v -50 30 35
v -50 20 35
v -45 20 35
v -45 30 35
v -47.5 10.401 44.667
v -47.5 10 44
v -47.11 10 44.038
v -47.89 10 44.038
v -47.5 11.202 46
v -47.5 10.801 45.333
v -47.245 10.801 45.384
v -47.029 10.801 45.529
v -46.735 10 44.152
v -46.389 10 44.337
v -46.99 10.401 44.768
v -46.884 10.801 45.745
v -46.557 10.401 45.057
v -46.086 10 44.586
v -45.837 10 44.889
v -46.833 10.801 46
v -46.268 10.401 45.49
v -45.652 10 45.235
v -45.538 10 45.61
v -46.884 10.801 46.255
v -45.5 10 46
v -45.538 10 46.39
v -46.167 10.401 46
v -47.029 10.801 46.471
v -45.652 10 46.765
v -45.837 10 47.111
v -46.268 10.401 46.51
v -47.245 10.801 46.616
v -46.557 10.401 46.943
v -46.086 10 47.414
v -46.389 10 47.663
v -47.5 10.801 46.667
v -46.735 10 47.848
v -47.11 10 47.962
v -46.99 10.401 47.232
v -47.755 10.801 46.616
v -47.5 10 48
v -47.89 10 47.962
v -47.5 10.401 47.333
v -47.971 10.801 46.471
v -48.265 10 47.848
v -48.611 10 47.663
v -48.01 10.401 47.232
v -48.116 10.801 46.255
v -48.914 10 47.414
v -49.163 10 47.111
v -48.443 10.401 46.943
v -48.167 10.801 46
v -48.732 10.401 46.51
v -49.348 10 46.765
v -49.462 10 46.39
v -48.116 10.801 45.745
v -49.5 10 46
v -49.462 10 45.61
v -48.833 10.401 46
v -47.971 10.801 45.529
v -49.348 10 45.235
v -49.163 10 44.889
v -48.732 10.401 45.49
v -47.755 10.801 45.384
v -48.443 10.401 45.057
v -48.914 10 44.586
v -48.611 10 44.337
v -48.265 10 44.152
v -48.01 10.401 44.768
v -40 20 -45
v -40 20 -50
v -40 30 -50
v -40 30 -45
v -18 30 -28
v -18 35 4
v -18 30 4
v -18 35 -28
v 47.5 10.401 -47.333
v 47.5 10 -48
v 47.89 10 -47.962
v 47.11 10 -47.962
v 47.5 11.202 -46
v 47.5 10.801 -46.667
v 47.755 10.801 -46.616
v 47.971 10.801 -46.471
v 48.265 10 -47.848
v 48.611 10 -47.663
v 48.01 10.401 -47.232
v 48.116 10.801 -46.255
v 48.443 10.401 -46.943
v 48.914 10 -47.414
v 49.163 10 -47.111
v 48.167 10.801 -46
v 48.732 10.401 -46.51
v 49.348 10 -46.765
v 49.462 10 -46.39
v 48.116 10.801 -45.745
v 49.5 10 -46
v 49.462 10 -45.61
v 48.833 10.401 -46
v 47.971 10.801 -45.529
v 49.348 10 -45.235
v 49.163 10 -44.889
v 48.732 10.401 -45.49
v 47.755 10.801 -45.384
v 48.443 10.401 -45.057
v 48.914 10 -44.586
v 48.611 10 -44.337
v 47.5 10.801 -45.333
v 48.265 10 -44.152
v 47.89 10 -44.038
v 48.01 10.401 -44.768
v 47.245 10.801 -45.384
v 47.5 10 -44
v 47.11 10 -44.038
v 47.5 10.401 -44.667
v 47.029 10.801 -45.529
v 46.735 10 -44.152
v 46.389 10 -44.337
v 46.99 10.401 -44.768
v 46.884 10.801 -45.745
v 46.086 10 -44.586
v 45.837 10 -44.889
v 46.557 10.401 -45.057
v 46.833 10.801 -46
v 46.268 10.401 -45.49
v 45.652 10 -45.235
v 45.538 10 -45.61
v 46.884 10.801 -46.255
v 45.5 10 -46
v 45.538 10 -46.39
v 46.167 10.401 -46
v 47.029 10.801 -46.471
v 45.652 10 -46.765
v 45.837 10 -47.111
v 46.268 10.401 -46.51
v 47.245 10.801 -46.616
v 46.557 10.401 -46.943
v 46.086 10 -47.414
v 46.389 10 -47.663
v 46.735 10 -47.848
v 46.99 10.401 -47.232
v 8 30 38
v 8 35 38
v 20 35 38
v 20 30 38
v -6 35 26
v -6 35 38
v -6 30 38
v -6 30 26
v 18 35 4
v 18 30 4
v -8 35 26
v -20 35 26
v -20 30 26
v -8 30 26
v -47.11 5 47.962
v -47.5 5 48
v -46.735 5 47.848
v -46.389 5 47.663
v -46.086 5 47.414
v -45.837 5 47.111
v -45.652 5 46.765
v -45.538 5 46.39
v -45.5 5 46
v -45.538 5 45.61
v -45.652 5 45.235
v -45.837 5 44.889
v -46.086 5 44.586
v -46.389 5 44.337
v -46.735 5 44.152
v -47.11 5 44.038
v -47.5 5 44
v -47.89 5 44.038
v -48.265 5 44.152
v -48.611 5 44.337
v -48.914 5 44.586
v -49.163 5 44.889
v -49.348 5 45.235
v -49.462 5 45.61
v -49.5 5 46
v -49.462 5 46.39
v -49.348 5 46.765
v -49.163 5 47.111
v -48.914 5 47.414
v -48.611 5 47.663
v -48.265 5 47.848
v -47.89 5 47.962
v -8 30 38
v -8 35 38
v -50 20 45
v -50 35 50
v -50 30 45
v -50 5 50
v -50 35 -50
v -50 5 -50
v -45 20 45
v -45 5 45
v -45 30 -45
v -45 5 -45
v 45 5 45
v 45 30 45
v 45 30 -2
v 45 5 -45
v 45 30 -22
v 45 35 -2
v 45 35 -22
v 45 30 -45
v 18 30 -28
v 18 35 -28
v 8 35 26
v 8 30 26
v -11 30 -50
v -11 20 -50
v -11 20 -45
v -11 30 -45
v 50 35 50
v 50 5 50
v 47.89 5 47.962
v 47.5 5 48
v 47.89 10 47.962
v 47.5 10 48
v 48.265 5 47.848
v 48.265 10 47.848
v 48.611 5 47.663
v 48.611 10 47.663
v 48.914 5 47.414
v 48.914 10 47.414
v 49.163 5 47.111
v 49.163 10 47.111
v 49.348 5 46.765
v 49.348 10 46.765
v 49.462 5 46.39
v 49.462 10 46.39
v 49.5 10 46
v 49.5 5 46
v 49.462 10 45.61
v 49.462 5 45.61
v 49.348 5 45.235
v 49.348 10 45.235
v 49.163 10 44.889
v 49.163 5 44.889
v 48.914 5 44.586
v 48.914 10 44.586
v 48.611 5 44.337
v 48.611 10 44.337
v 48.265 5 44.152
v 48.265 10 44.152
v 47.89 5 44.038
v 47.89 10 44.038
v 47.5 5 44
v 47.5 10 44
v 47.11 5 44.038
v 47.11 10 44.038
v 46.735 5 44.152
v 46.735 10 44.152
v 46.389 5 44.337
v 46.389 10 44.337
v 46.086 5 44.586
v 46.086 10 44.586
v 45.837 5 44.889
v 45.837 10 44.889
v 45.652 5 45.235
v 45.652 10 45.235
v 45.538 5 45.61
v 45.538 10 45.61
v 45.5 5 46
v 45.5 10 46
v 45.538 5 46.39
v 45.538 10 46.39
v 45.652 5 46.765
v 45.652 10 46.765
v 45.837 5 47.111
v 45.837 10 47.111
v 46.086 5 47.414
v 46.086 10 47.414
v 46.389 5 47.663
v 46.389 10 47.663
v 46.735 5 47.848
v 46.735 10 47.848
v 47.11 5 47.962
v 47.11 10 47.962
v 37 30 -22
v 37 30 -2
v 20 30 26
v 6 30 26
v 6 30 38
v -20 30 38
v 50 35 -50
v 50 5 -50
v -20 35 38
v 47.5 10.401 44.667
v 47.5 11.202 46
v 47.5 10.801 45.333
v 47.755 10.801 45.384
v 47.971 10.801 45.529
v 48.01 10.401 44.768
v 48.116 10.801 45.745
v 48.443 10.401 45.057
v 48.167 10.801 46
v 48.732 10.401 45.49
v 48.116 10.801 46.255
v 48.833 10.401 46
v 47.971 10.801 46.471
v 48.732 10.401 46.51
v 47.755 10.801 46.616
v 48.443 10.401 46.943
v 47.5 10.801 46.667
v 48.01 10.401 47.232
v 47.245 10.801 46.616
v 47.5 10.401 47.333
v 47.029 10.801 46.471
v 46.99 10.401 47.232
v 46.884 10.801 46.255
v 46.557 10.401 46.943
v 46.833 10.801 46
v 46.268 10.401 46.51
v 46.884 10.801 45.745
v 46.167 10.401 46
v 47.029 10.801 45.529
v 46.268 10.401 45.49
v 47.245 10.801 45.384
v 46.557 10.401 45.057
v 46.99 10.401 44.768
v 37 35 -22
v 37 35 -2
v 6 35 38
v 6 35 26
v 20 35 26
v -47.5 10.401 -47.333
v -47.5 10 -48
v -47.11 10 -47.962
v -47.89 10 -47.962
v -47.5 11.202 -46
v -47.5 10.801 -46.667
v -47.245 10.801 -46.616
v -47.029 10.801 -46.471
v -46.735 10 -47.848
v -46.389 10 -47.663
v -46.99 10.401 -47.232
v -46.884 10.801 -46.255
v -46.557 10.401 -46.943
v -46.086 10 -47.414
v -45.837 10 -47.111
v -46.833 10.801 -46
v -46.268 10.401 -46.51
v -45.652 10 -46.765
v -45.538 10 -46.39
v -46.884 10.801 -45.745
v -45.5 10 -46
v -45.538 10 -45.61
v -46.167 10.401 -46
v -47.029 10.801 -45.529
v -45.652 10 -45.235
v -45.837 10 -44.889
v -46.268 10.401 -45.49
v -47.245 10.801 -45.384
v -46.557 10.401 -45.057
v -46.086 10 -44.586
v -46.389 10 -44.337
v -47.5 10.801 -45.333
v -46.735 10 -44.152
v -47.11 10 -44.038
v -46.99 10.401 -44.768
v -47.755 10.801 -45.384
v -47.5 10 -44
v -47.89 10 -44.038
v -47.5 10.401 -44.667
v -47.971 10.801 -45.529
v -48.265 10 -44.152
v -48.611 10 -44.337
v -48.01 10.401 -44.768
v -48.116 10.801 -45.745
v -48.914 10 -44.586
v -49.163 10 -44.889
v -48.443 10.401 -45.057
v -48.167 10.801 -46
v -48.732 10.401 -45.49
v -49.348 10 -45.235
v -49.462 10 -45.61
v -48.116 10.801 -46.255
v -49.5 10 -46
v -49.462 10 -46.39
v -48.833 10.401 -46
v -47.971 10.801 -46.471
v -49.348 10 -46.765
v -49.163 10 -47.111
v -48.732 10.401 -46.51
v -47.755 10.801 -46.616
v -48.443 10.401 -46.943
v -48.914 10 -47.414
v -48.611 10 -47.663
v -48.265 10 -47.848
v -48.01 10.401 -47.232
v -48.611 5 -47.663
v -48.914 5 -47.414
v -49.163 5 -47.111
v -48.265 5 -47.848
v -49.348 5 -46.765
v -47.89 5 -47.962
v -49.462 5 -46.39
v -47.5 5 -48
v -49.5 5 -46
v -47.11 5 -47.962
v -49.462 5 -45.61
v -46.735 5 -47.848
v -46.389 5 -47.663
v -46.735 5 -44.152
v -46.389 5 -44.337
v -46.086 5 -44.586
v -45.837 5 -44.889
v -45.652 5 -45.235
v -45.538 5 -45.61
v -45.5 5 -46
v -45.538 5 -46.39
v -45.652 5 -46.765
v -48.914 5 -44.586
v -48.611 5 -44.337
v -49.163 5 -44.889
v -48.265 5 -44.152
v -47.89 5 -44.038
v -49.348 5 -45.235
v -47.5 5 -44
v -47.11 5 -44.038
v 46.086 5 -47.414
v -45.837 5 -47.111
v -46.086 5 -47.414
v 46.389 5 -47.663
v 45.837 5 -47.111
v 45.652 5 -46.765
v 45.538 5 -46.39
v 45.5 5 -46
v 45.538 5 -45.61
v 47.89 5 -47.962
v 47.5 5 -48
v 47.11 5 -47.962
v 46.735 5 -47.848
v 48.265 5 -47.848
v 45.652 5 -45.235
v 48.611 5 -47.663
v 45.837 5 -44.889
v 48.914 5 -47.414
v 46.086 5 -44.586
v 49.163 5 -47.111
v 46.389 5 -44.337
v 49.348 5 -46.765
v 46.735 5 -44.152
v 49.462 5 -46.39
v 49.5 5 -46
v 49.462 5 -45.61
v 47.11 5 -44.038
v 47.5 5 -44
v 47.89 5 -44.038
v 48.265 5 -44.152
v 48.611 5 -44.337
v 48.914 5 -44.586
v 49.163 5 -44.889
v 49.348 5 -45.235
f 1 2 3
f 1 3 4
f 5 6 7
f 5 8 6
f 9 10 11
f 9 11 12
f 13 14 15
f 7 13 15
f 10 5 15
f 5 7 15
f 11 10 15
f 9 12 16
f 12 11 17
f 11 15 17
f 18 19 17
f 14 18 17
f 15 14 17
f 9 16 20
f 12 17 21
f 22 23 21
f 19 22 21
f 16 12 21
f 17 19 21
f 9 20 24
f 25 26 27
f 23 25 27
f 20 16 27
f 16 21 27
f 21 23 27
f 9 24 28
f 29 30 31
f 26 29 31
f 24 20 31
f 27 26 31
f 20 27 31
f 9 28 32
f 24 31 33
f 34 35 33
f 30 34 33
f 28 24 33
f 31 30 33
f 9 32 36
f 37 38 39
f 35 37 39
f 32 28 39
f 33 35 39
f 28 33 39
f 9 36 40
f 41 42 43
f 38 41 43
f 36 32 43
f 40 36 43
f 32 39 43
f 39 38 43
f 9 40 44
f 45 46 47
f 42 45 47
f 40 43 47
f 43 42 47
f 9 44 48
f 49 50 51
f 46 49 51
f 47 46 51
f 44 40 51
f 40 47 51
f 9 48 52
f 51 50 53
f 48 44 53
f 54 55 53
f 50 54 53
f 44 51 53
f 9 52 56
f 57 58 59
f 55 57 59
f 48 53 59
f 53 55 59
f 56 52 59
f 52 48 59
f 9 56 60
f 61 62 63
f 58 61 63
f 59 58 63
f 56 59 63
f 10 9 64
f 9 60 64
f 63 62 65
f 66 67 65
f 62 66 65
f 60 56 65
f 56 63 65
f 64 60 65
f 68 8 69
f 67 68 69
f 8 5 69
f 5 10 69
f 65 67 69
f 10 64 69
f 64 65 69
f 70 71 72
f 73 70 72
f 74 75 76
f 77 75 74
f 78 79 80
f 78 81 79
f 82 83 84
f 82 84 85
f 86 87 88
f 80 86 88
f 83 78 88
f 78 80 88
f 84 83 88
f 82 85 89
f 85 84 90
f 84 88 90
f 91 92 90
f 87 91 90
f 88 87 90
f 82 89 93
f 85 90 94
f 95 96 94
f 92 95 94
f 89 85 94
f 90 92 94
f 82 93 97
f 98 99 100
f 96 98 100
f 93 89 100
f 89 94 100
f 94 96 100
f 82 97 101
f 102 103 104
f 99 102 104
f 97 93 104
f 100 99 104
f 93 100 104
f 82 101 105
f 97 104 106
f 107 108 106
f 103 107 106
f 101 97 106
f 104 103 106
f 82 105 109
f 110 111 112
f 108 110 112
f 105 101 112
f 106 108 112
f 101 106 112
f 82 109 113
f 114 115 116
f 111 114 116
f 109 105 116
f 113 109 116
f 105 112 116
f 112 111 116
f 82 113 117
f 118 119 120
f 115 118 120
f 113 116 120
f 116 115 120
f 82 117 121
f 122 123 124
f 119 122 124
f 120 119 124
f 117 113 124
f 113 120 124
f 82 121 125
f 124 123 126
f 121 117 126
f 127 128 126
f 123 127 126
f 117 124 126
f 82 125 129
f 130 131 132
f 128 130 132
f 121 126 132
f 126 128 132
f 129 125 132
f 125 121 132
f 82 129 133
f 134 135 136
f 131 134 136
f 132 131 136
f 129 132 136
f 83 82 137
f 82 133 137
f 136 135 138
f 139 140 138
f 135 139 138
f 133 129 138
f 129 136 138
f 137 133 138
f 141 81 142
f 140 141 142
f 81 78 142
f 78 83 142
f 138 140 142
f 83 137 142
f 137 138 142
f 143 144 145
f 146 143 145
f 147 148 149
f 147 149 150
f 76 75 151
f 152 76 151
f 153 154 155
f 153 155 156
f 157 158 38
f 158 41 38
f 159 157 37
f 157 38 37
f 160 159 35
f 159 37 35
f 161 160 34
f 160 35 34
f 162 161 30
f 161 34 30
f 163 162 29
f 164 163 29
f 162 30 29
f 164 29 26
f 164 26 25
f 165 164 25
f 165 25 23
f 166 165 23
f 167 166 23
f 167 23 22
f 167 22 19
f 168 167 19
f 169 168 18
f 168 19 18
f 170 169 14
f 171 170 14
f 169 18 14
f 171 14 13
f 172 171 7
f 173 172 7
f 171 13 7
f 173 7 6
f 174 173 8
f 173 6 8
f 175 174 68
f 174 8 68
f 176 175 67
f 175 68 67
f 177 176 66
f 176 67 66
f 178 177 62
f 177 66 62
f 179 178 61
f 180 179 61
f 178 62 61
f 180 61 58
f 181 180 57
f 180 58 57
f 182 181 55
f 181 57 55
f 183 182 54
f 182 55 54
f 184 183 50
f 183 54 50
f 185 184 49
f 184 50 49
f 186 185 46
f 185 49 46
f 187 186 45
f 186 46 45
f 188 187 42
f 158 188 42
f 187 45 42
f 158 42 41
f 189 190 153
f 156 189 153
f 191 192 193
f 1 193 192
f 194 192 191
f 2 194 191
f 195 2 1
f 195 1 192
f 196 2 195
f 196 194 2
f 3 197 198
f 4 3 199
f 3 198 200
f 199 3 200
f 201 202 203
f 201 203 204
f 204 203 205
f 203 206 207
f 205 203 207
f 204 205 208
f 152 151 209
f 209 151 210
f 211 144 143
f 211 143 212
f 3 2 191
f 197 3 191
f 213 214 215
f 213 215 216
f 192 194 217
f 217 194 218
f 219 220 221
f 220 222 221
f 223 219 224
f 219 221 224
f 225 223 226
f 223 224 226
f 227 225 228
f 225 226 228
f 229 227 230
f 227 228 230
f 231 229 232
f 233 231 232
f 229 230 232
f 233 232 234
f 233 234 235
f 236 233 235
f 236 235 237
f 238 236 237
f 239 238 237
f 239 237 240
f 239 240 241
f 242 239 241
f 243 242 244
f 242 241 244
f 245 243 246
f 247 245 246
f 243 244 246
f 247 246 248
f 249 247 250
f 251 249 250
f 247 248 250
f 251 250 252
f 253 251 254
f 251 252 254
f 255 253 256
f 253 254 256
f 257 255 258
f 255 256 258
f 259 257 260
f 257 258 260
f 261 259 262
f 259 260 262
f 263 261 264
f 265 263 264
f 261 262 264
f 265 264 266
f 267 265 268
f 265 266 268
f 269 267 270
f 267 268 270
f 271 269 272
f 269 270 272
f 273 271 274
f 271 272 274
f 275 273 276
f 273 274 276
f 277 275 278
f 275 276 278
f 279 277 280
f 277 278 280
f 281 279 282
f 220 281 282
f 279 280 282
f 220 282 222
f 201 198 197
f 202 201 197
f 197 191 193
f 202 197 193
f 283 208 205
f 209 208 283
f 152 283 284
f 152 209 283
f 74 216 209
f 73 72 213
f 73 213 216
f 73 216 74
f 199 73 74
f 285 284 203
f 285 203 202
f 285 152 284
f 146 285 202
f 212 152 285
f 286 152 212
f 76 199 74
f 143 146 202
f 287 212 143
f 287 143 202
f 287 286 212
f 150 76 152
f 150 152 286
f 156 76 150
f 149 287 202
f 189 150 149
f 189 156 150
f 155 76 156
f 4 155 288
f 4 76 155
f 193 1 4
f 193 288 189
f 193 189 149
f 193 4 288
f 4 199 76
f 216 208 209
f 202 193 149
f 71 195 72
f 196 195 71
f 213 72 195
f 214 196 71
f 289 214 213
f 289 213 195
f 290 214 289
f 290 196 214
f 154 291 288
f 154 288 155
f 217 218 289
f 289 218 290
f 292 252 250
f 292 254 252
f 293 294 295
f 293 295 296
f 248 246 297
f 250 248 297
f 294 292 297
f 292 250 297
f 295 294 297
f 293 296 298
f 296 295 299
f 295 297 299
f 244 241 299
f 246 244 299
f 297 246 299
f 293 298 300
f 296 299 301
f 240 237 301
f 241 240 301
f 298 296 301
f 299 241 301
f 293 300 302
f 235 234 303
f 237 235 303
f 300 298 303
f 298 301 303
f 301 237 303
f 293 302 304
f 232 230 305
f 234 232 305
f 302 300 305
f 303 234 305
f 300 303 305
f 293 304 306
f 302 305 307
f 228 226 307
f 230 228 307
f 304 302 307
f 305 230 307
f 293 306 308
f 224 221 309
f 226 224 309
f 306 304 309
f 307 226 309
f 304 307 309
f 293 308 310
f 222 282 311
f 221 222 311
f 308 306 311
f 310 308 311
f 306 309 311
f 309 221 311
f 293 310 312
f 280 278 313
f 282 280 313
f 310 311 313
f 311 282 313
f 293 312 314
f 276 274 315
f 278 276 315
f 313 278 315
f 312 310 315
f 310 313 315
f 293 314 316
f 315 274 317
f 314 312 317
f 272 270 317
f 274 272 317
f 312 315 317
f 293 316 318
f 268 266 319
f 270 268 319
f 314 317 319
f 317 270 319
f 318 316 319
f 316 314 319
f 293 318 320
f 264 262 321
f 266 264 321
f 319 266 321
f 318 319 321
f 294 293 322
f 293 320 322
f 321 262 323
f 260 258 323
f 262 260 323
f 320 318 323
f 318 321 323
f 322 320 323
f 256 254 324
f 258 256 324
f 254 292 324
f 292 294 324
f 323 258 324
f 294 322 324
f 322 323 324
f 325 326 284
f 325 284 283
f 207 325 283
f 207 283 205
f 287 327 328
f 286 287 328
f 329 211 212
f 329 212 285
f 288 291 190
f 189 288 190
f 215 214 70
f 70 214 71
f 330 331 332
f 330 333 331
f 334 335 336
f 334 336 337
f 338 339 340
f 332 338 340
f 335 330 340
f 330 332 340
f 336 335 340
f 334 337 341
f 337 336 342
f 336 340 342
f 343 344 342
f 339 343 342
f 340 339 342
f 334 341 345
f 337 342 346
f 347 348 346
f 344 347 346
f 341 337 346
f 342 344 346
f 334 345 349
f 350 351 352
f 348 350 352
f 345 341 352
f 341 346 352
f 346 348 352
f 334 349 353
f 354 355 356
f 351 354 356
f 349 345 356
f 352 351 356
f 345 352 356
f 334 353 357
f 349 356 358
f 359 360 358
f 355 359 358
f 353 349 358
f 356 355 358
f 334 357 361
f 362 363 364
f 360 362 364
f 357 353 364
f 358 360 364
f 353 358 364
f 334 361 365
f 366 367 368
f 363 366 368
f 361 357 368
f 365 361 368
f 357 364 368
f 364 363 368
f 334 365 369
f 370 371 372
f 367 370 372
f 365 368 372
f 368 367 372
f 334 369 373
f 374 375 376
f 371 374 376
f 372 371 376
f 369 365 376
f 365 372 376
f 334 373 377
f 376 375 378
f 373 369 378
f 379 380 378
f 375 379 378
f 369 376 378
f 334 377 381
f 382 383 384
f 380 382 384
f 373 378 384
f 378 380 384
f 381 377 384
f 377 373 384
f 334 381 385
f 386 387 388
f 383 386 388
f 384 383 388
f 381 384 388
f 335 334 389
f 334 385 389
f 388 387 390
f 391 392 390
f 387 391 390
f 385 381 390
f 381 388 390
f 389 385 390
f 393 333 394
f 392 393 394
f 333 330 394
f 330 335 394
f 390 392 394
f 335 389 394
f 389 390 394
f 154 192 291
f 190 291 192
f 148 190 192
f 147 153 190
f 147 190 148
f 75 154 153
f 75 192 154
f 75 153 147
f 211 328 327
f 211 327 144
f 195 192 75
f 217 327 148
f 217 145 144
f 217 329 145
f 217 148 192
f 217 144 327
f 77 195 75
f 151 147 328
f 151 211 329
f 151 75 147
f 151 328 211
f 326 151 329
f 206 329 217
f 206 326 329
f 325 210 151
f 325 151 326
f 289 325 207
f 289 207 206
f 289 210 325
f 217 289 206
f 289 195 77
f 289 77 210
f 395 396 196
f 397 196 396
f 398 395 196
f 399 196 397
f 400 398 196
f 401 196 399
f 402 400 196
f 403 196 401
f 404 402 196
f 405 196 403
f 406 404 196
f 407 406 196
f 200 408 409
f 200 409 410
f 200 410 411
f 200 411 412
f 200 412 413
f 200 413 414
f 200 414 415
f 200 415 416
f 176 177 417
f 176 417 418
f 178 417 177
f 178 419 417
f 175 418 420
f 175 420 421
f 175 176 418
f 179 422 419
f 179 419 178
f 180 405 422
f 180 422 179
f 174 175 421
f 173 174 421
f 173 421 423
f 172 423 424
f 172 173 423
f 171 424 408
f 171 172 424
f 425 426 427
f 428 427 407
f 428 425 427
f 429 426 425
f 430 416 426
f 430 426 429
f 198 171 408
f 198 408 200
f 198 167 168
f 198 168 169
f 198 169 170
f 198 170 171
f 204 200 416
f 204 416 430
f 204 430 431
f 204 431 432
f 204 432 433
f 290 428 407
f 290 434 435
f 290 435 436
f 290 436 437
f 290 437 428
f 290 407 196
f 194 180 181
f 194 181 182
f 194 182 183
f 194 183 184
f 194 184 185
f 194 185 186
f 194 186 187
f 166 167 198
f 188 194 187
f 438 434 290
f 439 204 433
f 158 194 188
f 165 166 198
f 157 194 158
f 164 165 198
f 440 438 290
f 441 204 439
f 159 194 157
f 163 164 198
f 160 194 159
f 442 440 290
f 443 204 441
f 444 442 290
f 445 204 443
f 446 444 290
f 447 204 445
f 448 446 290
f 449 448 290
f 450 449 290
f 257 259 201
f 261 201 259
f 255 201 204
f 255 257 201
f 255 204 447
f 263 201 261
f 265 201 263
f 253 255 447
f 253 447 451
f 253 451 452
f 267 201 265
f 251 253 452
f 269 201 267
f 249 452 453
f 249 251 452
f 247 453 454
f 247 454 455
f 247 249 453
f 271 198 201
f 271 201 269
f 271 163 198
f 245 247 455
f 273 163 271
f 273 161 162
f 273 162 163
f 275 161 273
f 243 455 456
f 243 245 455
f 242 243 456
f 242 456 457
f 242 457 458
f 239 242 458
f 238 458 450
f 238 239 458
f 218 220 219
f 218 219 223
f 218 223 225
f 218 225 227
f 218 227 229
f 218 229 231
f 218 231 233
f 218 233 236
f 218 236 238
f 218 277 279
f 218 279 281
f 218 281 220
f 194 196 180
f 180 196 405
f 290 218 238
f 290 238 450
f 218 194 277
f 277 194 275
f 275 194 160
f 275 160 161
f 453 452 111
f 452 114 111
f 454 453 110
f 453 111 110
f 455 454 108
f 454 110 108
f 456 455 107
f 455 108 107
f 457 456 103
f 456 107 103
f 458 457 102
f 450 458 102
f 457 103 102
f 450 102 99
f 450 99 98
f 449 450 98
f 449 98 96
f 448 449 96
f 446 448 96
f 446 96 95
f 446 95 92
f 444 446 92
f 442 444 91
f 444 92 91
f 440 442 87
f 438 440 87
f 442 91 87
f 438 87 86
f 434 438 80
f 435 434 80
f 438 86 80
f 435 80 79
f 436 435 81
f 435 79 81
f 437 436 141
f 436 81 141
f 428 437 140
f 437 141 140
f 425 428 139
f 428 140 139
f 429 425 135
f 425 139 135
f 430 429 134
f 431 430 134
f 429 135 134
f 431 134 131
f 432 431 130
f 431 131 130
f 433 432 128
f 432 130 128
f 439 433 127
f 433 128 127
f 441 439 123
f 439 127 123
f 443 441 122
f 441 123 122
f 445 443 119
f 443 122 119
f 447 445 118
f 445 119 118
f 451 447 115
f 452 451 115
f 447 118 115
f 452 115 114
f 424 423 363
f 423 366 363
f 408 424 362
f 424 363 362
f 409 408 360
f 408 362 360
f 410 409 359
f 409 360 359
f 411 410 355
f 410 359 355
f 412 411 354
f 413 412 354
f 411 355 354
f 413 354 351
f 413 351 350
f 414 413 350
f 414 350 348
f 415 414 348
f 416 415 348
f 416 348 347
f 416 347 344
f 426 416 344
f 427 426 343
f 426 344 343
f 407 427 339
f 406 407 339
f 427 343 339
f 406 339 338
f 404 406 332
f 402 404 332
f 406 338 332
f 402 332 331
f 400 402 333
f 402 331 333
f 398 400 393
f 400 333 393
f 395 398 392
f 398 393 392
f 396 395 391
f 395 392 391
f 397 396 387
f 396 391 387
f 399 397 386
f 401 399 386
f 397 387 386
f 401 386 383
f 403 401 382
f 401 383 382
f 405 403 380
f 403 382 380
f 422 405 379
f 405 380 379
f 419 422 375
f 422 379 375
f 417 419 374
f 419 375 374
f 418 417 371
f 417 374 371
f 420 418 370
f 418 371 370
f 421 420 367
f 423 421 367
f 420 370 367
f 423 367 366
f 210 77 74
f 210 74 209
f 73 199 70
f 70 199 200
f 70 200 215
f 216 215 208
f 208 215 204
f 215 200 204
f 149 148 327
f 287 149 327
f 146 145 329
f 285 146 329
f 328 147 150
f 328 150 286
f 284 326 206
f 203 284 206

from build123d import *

# Parameters (mm, degrees)
SKETCH1_W                 = 100
SKETCH1_H                 = 100
BOSS_EXTRUDE1_DEPTH       = 30
SHELL2_T                  = -5
SKETCH2_W                 = 100
SKETCH2_H                 = 100
BOSS_EXTRUDE2_DEPTH       = 5
SKETCH3_W                 = 12
SKETCH3_H                 = 12
SKETCH3_W_2               = 36
SKETCH3_H_2               = 32
SKETCH3_W_3               = 8
SKETCH3_H_3               = 20
CUT_EXTRUDE1_DEPTH        = 5
SKETCH5_W                 = 10
SKETCH5_H                 = 10
CUT_EXTRUDE2_DEPTH        = 5
SKETCH6_W                 = 29
SKETCH6_H                 = 10
CUT_EXTRUDE3_DEPTH        = 5
SKETCH8_W                 = 100
SKETCH8_H                 = 100
CUT_EXTRUDE4_DEPTH        = 5
F_4_0MM_DOWEL_HOLE1_D     = 4
F_4_0MM_DOWEL_HOLE1_DEPTH = 5
F_4_0MM_DOWEL_HOLE1_TIP   = 1.201721238


with BuildPart() as part:
    # Sketch1 → Boss-Extrude1 (new body)
    with BuildSketch(Plane(origin=(0, 0, 0), x_dir=(1, 0, 0), z_dir=(0, 1, 0))):
        Rectangle(SKETCH1_W, SKETCH1_H)
    extrude(amount=BOSS_EXTRUDE1_DEPTH)

    # Shell2
    shell2_openings = [part.faces().sort_by_distance(p)[0] for p in [
        (0, 30, 0),
    ]]
    offset(amount=SHELL2_T, openings=shell2_openings, kind=Kind.INTERSECTION)

    # Sketch2 → Boss-Extrude2 (add)
    with BuildSketch(Plane(origin=(0, 30, 0), x_dir=(1, 0, 0), z_dir=(0, 1, 0))):
        Rectangle(SKETCH2_W, SKETCH2_H)
    extrude(amount=BOSS_EXTRUDE2_DEPTH)

    # Sketch3 → Cut-Extrude1 (cut)
    with BuildSketch(Plane(origin=(0, 35, 0), x_dir=(1, 0, 0), z_dir=(0, 1, 0))):
        with Locations((-14, -32)):
            Rectangle(SKETCH3_W, SKETCH3_H)
        with Locations((0, -32)):
            Rectangle(SKETCH3_W, SKETCH3_H)
        with Locations((14, -32)):
            Rectangle(SKETCH3_W, SKETCH3_H)
        with Locations((0, 12)):
            Rectangle(SKETCH3_W_2, SKETCH3_H_2)
        with Locations((41, 12)):
            Rectangle(SKETCH3_W_3, SKETCH3_H_3)
    extrude(amount=-CUT_EXTRUDE1_DEPTH, mode=Mode.SUBTRACT)

    # Sketch5 → Cut-Extrude2 (cut)
    with BuildSketch(Plane.ZY.offset(50)):
        with Locations((40, 25)):
            Rectangle(SKETCH5_W, SKETCH5_H)
    extrude(amount=-CUT_EXTRUDE2_DEPTH, mode=Mode.SUBTRACT)

    # Sketch6 → Cut-Extrude3 (cut)
    with BuildSketch(Plane(origin=(0, 0, -50), x_dir=(-1, 0, 0), z_dir=(0, 0, -1))):
        with Locations((25.5, 25)):
            Rectangle(SKETCH6_W, SKETCH6_H)
    extrude(amount=-CUT_EXTRUDE3_DEPTH, mode=Mode.SUBTRACT)

    # Sketch8 → Cut-Extrude4 (cut)
    with BuildSketch(Plane.XZ):
        Rectangle(SKETCH8_W, SKETCH8_H)
    extrude(amount=-CUT_EXTRUDE4_DEPTH, mode=Mode.SUBTRACT)

    # Ø4.0mm Dowel Hole1
    with Locations(Plane(origin=(-47.5, 5, 46), x_dir=(0, 0, -1), z_dir=(0, -1, 0))):
        with Locations((0, 0), (0, 95), (92, 95), (92, 0)):
            Hole(F_4_0MM_DOWEL_HOLE1_D / 2, depth=F_4_0MM_DOWEL_HOLE1_DEPTH)
            with Locations((0, 0, -(F_4_0MM_DOWEL_HOLE1_DEPTH + F_4_0MM_DOWEL_HOLE1_TIP / 2))):  # 118° drill point
                Cone(0, F_4_0MM_DOWEL_HOLE1_D / 2, F_4_0MM_DOWEL_HOLE1_TIP, mode=Mode.SUBTRACT)


solid = part.part
